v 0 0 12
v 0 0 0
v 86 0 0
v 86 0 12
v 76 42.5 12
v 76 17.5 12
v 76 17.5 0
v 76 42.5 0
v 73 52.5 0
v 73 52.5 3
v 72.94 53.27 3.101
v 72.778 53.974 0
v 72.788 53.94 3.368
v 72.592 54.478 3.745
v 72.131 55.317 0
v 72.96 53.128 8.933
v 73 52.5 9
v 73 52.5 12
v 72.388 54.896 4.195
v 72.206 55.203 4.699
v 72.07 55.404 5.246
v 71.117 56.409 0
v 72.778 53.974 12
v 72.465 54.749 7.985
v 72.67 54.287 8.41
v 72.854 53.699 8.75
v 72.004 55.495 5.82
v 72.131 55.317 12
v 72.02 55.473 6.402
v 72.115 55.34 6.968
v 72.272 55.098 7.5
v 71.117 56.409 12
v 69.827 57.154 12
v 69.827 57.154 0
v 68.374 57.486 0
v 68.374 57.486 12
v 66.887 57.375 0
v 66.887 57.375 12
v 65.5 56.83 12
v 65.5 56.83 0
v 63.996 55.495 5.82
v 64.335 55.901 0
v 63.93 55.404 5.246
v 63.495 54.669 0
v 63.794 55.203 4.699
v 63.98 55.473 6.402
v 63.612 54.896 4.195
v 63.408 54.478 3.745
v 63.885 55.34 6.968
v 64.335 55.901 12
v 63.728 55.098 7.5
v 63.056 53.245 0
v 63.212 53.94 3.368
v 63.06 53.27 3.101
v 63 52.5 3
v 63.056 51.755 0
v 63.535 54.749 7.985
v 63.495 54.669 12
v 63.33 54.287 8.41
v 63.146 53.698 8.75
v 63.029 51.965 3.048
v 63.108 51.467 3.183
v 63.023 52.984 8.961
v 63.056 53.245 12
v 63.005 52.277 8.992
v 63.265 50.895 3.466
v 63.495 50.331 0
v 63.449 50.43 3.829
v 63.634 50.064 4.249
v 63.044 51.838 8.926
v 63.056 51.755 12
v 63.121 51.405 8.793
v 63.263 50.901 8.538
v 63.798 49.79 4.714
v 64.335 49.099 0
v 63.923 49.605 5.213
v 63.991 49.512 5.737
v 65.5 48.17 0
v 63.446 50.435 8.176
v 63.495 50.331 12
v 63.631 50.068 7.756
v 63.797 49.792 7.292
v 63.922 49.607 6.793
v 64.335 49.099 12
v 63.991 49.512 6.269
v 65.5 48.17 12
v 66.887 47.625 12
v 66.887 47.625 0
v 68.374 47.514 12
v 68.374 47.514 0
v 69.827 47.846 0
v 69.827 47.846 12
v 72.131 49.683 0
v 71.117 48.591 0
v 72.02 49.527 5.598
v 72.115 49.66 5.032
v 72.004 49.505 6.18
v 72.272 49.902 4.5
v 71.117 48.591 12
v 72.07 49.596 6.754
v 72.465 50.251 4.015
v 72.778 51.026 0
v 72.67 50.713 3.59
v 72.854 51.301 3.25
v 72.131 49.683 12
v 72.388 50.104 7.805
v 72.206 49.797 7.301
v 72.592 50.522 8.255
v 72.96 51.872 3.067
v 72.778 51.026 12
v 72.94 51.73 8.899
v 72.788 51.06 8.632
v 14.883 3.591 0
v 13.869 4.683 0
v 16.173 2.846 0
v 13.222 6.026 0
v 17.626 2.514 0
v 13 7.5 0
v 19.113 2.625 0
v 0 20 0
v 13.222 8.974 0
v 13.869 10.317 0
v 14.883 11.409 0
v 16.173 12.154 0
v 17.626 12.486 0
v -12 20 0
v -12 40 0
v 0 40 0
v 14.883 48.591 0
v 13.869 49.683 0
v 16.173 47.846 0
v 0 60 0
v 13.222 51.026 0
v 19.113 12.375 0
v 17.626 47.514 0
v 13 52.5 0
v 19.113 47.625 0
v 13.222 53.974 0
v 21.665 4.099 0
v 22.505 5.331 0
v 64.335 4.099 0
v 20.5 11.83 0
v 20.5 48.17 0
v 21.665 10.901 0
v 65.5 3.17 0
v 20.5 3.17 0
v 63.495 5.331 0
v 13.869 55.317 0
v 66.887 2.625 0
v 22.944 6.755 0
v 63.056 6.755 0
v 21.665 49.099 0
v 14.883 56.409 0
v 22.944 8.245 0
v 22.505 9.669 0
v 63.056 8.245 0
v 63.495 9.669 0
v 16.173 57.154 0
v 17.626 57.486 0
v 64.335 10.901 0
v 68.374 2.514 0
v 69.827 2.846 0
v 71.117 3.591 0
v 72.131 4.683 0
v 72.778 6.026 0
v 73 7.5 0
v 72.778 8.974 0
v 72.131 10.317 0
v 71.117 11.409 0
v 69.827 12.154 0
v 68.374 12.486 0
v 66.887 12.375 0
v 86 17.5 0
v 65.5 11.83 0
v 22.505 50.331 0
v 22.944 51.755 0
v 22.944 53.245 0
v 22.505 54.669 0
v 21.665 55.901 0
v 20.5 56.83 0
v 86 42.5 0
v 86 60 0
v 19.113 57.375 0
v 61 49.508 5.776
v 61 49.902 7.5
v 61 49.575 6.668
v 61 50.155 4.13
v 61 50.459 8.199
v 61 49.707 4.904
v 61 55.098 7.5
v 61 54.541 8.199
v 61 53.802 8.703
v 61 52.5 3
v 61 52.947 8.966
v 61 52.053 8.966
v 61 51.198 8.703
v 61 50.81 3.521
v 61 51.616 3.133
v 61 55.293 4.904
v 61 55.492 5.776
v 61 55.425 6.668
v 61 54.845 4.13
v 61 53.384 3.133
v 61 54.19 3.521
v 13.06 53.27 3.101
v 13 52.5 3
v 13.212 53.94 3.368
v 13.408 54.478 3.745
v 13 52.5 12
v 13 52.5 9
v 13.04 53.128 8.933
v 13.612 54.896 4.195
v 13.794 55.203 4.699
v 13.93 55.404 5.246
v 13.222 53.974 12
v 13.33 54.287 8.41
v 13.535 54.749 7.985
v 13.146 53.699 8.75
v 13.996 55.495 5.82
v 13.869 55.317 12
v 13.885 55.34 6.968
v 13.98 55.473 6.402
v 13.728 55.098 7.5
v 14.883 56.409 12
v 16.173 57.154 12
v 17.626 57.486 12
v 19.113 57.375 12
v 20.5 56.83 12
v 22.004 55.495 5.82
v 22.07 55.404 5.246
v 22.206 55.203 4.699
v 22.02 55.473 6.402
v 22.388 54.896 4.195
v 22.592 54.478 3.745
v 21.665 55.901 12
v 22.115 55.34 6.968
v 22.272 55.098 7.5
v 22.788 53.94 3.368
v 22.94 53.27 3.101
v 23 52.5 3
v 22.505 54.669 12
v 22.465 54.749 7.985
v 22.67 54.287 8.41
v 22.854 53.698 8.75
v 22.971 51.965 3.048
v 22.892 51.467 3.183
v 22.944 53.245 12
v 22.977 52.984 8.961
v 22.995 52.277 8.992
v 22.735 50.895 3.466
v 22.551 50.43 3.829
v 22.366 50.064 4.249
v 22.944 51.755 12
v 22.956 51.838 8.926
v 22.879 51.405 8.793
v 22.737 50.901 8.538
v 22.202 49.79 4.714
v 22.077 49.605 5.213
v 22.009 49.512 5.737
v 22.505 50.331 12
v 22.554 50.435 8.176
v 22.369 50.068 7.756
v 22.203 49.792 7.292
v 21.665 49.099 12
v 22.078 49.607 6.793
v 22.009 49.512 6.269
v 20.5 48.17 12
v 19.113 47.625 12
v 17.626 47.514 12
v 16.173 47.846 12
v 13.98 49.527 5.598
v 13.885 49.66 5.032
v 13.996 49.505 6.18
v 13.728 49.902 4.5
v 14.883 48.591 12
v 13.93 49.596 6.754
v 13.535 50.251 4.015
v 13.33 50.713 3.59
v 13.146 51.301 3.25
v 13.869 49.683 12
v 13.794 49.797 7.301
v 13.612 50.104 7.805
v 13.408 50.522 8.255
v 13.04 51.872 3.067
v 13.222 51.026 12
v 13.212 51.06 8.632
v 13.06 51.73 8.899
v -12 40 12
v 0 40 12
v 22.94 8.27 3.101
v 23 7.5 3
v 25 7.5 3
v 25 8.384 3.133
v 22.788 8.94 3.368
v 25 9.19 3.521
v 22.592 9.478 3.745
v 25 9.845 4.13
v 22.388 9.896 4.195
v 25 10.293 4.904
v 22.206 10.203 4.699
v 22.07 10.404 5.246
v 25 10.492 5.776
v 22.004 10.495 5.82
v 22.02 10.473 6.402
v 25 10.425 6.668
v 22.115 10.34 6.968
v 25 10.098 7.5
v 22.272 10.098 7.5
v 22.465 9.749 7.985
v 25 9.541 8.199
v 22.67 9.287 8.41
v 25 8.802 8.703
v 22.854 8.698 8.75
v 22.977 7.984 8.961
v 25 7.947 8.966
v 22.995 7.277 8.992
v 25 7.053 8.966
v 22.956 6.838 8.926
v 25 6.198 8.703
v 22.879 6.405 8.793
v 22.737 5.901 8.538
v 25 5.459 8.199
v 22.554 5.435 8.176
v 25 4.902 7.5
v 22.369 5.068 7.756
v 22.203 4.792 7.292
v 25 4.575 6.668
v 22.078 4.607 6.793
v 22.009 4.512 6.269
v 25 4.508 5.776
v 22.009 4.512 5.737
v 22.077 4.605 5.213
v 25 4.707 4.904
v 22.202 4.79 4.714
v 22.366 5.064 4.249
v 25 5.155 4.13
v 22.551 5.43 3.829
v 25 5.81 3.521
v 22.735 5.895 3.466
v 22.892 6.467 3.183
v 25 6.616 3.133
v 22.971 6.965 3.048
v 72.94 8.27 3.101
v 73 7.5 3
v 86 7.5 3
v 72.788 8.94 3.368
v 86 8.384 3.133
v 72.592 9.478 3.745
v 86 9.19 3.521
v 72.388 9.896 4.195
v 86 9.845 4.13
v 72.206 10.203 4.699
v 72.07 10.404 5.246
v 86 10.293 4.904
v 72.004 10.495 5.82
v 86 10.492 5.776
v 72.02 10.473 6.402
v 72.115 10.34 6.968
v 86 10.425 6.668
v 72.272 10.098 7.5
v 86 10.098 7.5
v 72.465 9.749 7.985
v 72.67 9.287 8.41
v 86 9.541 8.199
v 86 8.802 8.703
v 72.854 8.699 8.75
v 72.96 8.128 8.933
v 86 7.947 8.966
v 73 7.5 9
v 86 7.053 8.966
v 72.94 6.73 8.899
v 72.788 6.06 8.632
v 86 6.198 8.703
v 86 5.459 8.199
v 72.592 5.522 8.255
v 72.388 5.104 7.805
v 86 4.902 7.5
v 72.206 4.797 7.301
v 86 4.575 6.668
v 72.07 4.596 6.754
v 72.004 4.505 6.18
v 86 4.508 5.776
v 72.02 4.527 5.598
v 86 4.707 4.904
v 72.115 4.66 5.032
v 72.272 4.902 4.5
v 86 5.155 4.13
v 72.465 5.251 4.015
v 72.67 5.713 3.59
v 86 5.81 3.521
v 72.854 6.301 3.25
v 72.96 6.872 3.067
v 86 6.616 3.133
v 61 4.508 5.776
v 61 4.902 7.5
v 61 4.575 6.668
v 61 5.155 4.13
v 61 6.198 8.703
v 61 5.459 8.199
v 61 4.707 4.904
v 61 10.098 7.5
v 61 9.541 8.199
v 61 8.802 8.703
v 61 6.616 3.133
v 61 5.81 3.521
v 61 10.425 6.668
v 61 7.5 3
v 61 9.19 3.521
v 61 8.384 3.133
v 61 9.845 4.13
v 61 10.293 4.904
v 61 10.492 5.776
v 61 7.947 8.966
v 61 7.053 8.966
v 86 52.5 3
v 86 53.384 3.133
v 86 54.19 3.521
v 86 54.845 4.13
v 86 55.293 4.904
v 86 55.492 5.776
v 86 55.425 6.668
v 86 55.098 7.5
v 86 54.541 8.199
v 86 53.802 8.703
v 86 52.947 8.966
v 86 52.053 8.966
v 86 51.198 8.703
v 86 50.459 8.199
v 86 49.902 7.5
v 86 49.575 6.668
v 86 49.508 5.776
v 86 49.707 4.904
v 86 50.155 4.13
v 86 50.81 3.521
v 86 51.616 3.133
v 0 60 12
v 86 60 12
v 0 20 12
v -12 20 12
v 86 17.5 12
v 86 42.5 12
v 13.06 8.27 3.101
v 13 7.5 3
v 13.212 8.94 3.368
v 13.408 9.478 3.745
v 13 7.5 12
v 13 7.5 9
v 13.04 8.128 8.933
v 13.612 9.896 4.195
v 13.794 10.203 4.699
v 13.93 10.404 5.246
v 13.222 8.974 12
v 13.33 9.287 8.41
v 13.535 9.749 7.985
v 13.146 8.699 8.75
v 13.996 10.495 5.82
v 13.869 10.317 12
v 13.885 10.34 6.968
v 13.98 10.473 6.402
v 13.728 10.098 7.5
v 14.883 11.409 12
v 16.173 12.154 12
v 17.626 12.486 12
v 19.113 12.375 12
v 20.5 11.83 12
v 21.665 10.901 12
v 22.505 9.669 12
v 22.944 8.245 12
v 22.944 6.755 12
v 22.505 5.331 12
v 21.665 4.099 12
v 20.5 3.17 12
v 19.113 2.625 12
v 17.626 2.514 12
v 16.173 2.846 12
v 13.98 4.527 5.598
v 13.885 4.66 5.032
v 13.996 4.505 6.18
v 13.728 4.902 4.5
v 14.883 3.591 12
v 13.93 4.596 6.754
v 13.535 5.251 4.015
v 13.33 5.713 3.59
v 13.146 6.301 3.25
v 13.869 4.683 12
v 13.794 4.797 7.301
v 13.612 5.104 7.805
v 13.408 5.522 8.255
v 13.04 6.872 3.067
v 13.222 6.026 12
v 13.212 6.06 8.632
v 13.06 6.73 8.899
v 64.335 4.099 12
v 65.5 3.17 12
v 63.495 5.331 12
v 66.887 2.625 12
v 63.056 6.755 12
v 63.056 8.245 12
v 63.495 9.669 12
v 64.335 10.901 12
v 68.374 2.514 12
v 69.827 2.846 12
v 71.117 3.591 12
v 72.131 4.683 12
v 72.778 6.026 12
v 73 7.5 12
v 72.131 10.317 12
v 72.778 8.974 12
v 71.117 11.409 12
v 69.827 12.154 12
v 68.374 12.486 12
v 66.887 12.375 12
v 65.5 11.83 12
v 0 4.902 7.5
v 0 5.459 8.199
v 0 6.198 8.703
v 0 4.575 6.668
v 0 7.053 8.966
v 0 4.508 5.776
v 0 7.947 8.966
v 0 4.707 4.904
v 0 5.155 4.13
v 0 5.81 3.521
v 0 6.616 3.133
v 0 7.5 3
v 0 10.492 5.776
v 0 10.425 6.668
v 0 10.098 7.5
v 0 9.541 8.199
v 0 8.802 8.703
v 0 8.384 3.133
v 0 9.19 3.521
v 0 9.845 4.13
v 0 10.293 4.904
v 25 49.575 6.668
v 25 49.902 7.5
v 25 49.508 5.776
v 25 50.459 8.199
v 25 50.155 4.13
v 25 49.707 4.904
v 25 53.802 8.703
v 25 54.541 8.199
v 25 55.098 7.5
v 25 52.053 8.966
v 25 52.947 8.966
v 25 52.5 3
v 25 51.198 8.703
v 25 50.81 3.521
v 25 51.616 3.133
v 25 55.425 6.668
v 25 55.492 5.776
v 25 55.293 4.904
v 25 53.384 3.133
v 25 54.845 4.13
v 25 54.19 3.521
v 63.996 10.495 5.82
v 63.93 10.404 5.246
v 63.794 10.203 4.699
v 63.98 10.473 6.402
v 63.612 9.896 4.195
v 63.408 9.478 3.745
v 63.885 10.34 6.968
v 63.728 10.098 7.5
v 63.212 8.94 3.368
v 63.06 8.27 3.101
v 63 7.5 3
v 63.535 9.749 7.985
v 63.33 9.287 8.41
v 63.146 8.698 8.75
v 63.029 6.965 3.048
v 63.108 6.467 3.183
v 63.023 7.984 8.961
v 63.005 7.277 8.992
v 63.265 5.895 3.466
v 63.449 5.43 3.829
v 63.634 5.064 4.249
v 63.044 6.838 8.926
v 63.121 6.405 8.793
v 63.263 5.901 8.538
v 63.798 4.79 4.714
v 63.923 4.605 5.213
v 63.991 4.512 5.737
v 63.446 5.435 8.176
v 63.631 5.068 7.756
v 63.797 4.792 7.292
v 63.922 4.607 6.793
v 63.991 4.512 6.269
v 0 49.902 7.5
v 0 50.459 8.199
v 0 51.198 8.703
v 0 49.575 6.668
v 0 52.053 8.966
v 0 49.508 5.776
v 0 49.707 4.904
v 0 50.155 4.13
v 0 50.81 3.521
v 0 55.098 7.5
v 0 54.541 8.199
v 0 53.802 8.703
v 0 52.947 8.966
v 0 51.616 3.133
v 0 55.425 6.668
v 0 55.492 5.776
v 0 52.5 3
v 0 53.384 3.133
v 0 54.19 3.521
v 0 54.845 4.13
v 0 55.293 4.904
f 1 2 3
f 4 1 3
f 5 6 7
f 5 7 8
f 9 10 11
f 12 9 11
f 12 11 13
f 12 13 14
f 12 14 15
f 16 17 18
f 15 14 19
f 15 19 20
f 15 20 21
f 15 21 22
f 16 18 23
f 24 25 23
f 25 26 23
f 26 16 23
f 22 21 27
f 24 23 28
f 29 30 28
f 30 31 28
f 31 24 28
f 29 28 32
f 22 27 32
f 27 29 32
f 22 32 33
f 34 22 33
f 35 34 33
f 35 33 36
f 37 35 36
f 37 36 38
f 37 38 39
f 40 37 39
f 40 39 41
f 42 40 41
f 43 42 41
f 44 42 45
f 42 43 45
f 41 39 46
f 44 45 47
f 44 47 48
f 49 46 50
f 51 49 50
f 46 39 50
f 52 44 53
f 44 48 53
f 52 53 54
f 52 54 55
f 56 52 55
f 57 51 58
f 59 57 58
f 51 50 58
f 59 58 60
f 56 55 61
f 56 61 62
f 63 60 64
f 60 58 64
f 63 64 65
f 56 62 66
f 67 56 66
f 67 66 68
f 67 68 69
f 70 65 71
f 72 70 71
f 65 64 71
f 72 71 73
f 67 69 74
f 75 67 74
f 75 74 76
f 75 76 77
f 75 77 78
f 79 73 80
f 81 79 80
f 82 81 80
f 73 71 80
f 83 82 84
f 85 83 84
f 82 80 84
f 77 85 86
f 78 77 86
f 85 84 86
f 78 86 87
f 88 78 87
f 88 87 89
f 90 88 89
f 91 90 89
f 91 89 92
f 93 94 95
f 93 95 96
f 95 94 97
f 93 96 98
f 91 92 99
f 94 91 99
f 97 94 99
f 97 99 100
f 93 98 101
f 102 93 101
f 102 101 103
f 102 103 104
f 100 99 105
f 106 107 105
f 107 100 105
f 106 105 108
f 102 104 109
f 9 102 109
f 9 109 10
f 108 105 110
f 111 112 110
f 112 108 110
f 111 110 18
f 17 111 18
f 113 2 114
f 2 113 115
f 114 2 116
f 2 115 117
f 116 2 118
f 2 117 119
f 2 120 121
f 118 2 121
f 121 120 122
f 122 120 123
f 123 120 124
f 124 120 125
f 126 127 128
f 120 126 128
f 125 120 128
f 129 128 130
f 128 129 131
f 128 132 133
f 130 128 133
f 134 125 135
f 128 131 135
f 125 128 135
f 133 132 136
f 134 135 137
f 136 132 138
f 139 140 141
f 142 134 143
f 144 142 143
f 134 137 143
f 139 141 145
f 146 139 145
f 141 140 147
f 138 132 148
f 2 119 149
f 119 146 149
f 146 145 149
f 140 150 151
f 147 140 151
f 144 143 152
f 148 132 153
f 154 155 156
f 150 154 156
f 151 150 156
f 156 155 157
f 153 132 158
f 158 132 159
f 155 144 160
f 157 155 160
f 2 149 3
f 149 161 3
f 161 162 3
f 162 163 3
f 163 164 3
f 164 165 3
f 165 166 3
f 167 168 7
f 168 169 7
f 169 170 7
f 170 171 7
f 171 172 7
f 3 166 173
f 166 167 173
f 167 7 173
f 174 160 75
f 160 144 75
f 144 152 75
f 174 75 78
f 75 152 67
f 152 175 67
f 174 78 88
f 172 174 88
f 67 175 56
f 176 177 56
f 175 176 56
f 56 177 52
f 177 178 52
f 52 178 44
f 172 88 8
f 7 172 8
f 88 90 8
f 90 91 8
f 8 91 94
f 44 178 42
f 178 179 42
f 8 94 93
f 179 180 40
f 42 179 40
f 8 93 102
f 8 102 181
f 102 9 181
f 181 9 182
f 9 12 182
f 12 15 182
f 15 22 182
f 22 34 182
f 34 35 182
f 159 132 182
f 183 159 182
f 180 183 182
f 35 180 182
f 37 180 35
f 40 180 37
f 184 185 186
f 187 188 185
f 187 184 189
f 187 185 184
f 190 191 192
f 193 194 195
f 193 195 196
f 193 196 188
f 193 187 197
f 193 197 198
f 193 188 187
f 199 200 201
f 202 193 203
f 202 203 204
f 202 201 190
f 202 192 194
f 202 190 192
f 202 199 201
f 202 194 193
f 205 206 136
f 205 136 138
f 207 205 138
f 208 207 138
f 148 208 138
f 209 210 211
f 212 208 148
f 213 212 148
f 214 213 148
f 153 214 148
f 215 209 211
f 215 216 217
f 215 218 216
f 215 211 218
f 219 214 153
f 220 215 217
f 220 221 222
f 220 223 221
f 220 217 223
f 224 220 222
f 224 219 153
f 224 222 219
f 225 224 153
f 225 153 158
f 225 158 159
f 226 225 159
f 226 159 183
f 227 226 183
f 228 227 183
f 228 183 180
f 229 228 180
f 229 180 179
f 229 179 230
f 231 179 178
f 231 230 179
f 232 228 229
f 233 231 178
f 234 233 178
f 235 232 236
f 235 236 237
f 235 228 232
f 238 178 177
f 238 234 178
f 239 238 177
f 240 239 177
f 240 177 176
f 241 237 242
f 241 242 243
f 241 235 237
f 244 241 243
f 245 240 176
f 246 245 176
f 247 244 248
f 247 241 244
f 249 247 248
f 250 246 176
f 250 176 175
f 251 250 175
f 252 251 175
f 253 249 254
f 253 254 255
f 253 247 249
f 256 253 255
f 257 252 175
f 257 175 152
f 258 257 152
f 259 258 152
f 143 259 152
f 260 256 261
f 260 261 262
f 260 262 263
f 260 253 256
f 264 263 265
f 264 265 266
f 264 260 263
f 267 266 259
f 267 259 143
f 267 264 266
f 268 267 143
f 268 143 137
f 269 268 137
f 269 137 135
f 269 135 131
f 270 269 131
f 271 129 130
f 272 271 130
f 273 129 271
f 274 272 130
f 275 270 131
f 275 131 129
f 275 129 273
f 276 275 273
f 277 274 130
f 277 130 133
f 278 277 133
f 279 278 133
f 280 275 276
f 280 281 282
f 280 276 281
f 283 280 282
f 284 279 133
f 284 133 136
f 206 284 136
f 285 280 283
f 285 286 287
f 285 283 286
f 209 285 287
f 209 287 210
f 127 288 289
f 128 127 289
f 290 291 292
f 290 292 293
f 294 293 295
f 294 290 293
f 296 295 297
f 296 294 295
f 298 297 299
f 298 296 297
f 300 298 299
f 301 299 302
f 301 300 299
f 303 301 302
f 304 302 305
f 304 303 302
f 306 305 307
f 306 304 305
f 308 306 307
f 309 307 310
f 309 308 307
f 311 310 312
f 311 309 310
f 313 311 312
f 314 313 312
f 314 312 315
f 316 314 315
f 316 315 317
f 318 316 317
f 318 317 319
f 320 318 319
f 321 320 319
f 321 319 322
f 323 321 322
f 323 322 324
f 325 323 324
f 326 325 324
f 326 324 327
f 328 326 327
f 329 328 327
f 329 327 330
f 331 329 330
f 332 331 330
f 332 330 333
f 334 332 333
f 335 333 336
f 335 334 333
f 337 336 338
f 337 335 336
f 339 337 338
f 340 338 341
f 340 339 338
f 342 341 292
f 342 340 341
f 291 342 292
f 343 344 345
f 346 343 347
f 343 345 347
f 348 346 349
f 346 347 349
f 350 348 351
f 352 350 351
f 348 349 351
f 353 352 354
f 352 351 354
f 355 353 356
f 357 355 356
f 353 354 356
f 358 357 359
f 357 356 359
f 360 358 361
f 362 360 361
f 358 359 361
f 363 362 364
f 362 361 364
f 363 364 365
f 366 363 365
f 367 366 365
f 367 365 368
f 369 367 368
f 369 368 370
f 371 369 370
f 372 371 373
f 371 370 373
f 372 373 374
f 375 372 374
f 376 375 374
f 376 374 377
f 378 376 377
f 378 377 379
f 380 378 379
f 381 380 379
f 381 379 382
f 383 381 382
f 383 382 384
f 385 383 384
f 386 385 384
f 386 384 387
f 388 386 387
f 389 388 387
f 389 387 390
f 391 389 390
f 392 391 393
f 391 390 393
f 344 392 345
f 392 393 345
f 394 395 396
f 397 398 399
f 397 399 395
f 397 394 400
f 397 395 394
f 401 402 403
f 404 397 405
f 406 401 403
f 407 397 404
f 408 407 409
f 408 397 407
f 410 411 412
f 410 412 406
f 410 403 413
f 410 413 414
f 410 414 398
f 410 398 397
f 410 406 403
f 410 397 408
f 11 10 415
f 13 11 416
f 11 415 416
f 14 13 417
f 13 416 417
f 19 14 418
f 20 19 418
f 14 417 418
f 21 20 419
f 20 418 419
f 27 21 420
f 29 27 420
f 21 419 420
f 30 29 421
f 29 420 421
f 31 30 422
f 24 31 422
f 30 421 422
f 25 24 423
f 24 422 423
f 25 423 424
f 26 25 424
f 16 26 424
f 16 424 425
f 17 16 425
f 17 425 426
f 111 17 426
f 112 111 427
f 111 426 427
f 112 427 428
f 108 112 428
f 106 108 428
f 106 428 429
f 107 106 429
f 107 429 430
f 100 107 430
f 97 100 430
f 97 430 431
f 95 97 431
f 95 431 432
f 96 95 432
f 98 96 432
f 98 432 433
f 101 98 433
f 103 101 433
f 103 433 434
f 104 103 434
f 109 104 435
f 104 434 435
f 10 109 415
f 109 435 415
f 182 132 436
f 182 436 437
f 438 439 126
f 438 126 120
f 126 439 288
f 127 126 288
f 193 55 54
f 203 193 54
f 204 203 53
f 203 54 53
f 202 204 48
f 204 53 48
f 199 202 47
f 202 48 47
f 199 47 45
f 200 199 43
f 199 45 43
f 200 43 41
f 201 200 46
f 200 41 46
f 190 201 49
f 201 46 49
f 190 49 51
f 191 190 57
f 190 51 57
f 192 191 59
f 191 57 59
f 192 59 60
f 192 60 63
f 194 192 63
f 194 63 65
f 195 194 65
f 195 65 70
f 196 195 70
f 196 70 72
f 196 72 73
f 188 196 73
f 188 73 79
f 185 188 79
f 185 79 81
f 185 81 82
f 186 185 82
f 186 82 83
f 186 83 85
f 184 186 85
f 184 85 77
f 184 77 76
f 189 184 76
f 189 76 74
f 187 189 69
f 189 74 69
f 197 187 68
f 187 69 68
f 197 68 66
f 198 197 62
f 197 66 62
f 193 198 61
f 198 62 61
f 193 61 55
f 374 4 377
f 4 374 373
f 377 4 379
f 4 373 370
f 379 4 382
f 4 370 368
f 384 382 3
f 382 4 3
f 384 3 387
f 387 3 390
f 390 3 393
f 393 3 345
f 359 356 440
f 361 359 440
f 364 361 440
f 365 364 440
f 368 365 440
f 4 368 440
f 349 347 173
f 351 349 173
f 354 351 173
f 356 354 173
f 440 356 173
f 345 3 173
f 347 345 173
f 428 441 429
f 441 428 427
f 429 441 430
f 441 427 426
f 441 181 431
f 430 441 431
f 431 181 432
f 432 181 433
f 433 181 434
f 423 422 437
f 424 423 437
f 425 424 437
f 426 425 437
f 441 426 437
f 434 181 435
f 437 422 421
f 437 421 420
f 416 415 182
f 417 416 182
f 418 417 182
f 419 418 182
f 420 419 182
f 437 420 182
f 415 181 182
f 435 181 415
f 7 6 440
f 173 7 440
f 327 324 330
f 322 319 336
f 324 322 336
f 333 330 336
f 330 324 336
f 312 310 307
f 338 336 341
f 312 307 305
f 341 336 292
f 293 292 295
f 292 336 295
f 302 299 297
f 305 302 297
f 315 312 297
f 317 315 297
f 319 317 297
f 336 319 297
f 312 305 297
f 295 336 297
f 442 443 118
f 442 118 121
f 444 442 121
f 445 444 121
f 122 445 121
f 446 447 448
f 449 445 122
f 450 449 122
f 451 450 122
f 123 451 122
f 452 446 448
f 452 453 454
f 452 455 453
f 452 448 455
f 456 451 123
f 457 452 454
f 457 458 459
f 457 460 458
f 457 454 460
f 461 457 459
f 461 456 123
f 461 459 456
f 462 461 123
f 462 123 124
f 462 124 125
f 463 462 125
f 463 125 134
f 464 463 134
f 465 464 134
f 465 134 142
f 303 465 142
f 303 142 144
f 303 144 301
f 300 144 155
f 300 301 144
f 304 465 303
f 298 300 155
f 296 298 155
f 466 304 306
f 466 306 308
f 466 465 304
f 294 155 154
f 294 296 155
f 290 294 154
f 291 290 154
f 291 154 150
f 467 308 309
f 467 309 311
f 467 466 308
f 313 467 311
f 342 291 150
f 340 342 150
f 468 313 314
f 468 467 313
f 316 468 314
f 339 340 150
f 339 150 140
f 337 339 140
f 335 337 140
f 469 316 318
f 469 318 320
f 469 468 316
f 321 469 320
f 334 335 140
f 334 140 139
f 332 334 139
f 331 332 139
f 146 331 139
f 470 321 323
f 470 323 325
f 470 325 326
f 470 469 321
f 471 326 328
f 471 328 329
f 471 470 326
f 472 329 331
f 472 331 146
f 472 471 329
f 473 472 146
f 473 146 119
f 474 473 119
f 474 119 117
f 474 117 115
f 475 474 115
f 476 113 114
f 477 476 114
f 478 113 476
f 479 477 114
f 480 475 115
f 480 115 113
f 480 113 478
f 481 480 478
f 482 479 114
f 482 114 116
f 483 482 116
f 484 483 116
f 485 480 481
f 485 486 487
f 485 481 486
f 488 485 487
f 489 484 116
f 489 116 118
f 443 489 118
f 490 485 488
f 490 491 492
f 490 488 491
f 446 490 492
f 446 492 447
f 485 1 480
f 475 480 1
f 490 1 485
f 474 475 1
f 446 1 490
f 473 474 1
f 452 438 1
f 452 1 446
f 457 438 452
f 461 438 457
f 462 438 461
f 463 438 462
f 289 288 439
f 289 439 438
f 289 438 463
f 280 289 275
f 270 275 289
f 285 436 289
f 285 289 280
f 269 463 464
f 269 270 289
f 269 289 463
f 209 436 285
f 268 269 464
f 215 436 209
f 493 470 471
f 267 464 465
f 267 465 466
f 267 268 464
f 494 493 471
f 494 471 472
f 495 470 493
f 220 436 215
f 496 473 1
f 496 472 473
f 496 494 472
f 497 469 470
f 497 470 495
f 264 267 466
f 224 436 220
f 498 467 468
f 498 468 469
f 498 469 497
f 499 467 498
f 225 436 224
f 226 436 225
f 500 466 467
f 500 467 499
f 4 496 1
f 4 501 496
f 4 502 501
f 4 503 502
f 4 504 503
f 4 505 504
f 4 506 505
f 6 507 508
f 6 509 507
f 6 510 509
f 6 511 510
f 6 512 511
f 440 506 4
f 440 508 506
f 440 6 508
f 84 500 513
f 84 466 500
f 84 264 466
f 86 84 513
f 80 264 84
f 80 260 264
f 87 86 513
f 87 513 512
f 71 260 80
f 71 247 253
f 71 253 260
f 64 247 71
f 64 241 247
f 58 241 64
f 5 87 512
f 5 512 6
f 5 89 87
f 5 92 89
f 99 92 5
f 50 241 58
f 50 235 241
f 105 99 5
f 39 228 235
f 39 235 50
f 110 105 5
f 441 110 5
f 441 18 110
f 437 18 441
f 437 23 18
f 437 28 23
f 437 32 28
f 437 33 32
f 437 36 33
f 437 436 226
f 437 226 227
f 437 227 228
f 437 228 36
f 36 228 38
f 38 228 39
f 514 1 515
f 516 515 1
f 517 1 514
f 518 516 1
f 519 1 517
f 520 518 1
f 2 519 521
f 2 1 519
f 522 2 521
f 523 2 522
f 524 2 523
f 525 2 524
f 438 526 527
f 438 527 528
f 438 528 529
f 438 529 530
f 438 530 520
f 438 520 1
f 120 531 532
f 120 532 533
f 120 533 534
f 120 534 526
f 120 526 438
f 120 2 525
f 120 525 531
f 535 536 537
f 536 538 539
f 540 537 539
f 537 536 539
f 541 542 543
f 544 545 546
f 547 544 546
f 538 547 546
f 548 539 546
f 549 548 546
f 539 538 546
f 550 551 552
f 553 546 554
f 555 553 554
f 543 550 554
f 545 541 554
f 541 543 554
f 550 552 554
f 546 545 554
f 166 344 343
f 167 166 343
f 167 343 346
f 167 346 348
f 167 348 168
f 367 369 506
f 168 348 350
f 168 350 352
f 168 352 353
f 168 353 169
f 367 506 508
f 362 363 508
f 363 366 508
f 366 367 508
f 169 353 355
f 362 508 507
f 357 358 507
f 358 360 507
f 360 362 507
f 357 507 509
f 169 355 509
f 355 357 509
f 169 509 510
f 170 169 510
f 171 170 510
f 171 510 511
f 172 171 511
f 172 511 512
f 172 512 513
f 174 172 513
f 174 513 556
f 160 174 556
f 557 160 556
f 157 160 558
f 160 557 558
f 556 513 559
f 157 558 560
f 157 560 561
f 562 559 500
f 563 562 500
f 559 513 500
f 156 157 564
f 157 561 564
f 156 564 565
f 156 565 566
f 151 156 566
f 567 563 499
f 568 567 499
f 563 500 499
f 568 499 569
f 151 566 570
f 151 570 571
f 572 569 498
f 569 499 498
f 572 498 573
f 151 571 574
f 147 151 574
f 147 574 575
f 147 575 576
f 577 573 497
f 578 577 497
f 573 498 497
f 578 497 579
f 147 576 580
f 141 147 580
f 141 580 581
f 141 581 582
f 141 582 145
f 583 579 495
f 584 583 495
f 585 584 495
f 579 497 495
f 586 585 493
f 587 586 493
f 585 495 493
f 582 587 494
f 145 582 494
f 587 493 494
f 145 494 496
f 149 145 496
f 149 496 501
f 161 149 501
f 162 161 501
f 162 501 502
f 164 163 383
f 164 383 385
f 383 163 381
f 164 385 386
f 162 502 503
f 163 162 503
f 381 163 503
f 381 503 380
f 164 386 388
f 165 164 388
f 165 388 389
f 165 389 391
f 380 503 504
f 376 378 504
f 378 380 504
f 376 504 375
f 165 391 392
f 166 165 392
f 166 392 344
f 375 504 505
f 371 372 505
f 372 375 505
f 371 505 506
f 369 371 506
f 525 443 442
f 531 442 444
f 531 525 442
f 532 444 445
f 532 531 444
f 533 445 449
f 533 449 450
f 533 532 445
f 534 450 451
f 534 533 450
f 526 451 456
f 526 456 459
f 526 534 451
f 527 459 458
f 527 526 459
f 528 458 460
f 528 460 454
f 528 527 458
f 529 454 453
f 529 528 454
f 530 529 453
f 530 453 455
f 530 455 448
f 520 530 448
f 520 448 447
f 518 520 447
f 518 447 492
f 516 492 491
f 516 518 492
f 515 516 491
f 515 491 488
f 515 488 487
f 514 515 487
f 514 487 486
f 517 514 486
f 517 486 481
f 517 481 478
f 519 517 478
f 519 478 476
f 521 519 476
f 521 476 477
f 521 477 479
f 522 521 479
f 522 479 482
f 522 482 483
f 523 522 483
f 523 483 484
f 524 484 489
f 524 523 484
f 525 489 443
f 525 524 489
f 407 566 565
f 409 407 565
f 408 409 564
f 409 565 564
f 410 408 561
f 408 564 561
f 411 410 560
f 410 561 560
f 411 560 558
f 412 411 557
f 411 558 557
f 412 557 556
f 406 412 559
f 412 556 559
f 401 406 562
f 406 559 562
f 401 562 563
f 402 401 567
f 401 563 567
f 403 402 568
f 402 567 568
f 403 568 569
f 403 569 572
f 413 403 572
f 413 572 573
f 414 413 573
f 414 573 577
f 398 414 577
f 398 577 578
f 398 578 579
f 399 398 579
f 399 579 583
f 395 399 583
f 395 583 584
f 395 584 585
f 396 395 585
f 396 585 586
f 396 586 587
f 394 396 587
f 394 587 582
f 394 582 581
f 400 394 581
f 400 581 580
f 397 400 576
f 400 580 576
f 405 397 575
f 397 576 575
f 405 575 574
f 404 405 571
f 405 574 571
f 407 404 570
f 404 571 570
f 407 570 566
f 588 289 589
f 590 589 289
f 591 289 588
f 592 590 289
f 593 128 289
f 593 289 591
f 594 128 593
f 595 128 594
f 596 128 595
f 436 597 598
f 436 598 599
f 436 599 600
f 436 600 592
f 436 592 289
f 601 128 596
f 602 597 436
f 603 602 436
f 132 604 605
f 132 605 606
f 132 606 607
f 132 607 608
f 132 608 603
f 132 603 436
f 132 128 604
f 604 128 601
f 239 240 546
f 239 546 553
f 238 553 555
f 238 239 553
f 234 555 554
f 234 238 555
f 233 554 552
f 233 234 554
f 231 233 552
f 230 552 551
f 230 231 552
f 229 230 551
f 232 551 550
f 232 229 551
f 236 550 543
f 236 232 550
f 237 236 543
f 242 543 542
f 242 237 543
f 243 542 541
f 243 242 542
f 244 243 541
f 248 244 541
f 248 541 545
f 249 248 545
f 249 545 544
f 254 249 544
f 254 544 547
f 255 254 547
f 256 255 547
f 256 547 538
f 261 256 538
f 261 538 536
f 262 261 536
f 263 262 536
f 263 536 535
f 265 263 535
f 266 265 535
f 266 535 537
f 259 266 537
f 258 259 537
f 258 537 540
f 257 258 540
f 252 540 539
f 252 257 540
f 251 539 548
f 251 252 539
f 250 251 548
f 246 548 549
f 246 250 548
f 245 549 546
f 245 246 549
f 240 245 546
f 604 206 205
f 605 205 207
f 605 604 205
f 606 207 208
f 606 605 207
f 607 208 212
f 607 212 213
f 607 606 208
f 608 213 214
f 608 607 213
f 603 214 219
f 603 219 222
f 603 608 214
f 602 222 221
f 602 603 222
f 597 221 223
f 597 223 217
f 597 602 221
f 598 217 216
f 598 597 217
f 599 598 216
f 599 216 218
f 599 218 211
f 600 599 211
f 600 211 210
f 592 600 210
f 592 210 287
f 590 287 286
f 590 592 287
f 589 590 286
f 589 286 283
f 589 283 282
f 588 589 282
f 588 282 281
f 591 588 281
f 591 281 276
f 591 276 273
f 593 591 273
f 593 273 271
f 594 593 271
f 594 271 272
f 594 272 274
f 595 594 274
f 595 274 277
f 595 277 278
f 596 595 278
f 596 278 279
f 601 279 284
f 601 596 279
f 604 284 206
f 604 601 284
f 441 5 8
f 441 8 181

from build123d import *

# Parameters (mm, degrees)
SKETCH1_W           = 86
SKETCH1_H           = 60
BOSS_EXTRUDE1_DEPTH = 12
CUT_EXTRUDE1_REACH  = 107.546
SKETCH2_W           = 20
SKETCH2_H           = 25
SKETCH3_W           = 24
SKETCH3_H           = 20
BOSS_EXTRUDE2_DEPTH = 12
CUT_EXTRUDE2_REACH  = 107.546
SKETCH4_R           = 5
SKETCH5_R           = 3
CUT_EXTRUDE3_DEPTH  = 25


with BuildPart() as part:
    # Sketch1 → Boss-Extrude1 (new body)
    with BuildSketch(Plane.XY):
        with Locations((43, 30)):
            Rectangle(SKETCH1_W, SKETCH1_H)
    extrude(amount=BOSS_EXTRUDE1_DEPTH)

    # Sketch2 → Cut-Extrude1 (cut, up to next)
    with BuildSketch(Plane.XY.offset(12), mode=Mode.PRIVATE) as cut_extrude1_sk1:
        with Locations((86, 30)):
            Rectangle(SKETCH2_W, SKETCH2_H)
    cut_extrude1_tool1 = extrude(cut_extrude1_sk1.sketch, amount=-CUT_EXTRUDE1_REACH, mode=Mode.PRIVATE) & part.part
    add(cut_extrude1_tool1.solids().sort_by_distance((86, 30, 12))[0], mode=Mode.SUBTRACT)

    # Sketch3 → Boss-Extrude2 (add)
    with BuildSketch(Plane.XY.offset(12)):
        with Locations((0, 30)):
            Rectangle(SKETCH3_W, SKETCH3_H)
    extrude(amount=-BOSS_EXTRUDE2_DEPTH)

    # Sketch4 → Cut-Extrude2 (cut, up to next)
    with BuildSketch(Plane.XY.offset(12), mode=Mode.PRIVATE) as cut_extrude2_sk1:
        with Locations((68, 52.5)):
            Circle(SKETCH4_R)
    cut_extrude2_tool1 = extrude(cut_extrude2_sk1.sketch, amount=-CUT_EXTRUDE2_REACH, mode=Mode.PRIVATE) & part.part
    # Sketch4 → Cut-Extrude2 (cut, up to next)
    with BuildSketch(Plane.XY.offset(12), mode=Mode.PRIVATE) as cut_extrude2_sk2:
        with Locations((68, 7.5)):
            Circle(SKETCH4_R)
    cut_extrude2_tool2 = extrude(cut_extrude2_sk2.sketch, amount=-CUT_EXTRUDE2_REACH, mode=Mode.PRIVATE) & part.part
    cut_extrude2_1 = cut_extrude2_tool1.solids().sort_by_distance((68, 52.5, 12))[0]
    add(cut_extrude2_1, mode=Mode.SUBTRACT)
    cut_extrude2_2 = cut_extrude2_tool2.solids().sort_by_distance((68, 7.5, 12))[0]
    add(cut_extrude2_2, mode=Mode.SUBTRACT)
    cut_extrude2 = cut_extrude2_1 + cut_extrude2_2  # Cut-Extrude2 as one shape, for the pattern or mirror that repeats it

    # Sketch5 → Cut-Extrude3 (cut)
    with BuildSketch(Plane(origin=(86, 0, 0), x_dir=(0, 0, -1), z_dir=(1, 0, 0))):
        with Locations((-6, 52.5)):
            Circle(SKETCH5_R)
        with Locations((-6, 7.5)):
            Circle(SKETCH5_R)
    cut_extrude3 = extrude(amount=-CUT_EXTRUDE3_DEPTH, mode=Mode.SUBTRACT)

    # Mirror2: Cut-Extrude2, Cut-Extrude3 across plane
    add(cut_extrude2.mirror(Plane.ZY.offset(-43)), mode=Mode.SUBTRACT)
    add(cut_extrude3.mirror(Plane.ZY.offset(-43)), mode=Mode.SUBTRACT)


solid = part.part
